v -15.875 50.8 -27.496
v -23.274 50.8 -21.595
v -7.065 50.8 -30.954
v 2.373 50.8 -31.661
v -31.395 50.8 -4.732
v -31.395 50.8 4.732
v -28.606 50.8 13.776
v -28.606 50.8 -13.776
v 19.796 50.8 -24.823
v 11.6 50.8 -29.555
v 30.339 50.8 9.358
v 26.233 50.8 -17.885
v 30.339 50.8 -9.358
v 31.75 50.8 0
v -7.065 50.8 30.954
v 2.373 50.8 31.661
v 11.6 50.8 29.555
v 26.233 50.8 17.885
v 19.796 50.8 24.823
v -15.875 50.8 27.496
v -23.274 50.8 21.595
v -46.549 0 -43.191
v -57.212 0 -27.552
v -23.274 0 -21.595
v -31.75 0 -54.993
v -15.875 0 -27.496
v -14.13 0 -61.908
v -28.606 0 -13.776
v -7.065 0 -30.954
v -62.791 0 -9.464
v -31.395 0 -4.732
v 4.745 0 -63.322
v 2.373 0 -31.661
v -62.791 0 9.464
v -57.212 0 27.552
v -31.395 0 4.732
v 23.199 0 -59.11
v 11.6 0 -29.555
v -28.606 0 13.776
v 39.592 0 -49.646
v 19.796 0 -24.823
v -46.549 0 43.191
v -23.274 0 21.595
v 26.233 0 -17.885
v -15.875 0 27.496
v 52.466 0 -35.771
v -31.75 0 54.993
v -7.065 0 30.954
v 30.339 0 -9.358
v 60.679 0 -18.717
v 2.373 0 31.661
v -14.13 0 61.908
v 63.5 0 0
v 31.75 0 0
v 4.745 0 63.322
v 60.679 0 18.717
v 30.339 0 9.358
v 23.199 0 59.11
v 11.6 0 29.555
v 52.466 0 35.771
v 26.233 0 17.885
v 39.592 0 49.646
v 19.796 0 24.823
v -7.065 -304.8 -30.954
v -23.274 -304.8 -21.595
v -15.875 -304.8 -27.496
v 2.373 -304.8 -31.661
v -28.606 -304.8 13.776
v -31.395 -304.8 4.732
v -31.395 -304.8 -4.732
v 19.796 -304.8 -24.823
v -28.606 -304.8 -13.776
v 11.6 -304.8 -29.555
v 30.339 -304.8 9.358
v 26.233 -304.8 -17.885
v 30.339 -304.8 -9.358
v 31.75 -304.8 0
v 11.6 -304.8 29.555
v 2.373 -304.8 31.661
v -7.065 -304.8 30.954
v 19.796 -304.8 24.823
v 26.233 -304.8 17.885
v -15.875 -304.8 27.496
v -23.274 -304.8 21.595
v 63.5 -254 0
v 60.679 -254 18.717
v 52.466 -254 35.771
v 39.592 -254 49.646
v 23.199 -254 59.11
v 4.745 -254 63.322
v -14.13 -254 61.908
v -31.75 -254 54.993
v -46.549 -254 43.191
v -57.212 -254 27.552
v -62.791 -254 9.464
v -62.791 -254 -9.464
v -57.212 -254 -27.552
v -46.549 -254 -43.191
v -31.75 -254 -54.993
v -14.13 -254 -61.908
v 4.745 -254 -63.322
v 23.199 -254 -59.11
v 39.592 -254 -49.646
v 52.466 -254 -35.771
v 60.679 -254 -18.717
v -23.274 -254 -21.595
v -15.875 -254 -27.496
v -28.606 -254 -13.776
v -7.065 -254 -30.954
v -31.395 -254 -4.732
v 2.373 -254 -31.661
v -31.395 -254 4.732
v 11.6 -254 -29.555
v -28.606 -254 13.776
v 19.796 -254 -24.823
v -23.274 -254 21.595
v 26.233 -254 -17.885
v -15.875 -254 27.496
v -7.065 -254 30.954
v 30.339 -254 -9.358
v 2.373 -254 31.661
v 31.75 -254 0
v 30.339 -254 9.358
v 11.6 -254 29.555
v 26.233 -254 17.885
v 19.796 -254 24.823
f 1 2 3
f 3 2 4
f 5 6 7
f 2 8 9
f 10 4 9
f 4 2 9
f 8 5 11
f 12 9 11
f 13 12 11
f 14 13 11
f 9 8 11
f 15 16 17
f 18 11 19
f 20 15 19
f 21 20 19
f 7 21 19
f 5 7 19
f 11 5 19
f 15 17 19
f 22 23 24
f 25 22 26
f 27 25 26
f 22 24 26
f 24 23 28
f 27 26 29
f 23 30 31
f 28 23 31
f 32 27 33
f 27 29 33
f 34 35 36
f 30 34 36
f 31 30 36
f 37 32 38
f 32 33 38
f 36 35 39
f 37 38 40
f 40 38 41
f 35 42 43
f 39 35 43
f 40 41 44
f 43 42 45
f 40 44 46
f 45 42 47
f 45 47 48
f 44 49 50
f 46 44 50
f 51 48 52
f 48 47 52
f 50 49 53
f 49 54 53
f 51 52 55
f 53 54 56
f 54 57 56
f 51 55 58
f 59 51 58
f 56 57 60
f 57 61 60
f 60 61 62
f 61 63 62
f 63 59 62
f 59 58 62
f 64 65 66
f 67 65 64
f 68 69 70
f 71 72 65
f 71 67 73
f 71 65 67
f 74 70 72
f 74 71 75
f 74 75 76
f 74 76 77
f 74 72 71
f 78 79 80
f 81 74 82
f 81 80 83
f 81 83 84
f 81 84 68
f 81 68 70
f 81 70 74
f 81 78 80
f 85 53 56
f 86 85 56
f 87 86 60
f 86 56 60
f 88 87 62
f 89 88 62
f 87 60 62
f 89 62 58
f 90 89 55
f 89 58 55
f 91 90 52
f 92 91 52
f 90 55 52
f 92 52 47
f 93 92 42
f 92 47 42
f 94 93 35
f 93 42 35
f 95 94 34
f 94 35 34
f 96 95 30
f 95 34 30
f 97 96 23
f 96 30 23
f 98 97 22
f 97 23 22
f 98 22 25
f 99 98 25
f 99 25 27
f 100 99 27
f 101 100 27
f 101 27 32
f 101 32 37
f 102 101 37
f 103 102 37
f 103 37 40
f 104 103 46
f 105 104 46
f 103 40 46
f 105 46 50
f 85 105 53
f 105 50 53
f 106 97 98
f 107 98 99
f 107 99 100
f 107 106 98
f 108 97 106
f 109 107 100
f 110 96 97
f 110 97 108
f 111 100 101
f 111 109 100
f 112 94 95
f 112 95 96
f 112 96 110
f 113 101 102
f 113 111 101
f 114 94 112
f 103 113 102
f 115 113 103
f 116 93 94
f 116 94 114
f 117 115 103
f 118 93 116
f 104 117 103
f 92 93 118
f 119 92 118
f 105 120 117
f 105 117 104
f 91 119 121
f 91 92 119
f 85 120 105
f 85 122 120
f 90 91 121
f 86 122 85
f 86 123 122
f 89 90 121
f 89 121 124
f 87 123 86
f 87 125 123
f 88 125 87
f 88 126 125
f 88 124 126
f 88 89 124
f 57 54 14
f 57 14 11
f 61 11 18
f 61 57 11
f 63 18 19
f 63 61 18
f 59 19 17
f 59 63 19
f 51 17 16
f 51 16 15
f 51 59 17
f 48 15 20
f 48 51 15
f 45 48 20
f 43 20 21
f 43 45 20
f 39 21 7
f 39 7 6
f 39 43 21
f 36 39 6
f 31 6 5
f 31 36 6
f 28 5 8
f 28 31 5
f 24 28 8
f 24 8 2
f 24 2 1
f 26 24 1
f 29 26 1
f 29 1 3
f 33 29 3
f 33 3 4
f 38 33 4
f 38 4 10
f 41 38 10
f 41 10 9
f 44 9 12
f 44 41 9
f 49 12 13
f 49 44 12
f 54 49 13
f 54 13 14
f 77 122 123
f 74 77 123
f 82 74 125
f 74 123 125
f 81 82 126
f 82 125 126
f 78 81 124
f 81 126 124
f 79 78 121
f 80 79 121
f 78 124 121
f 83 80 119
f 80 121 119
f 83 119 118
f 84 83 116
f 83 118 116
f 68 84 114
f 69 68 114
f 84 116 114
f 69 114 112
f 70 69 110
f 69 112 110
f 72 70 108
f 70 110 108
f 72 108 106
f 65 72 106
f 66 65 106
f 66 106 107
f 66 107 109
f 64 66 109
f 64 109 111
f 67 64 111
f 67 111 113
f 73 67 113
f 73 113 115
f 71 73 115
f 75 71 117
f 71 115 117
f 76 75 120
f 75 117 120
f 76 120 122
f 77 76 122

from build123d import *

# Parameters (mm, degrees)
F0_R     = 63.5
F1_DEPTH = 254
F2_R     = 31.75
F3_DEPTH = 50.8


# Not quite as in the source:
# - a pattern or mirror of a feature is missing from the dataset's text; its kind, count and spacing are read off the source's solid


with BuildPart() as f1:
    # F0 (on Front) → F1 (new body)
    with BuildSketch(Plane.XZ):
        Circle(F0_R)
    extrude(amount=F1_DEPTH)

    # F2 (on face) → F3 (join)
    with BuildSketch(Plane.XZ.offset(254)):
        Circle(F2_R)
    f3 = extrude(amount=F3_DEPTH)

    # F3_copies: F3 across plane
    add(f3.mirror(Plane.ZX.offset(-127)))


solid = f1.part
